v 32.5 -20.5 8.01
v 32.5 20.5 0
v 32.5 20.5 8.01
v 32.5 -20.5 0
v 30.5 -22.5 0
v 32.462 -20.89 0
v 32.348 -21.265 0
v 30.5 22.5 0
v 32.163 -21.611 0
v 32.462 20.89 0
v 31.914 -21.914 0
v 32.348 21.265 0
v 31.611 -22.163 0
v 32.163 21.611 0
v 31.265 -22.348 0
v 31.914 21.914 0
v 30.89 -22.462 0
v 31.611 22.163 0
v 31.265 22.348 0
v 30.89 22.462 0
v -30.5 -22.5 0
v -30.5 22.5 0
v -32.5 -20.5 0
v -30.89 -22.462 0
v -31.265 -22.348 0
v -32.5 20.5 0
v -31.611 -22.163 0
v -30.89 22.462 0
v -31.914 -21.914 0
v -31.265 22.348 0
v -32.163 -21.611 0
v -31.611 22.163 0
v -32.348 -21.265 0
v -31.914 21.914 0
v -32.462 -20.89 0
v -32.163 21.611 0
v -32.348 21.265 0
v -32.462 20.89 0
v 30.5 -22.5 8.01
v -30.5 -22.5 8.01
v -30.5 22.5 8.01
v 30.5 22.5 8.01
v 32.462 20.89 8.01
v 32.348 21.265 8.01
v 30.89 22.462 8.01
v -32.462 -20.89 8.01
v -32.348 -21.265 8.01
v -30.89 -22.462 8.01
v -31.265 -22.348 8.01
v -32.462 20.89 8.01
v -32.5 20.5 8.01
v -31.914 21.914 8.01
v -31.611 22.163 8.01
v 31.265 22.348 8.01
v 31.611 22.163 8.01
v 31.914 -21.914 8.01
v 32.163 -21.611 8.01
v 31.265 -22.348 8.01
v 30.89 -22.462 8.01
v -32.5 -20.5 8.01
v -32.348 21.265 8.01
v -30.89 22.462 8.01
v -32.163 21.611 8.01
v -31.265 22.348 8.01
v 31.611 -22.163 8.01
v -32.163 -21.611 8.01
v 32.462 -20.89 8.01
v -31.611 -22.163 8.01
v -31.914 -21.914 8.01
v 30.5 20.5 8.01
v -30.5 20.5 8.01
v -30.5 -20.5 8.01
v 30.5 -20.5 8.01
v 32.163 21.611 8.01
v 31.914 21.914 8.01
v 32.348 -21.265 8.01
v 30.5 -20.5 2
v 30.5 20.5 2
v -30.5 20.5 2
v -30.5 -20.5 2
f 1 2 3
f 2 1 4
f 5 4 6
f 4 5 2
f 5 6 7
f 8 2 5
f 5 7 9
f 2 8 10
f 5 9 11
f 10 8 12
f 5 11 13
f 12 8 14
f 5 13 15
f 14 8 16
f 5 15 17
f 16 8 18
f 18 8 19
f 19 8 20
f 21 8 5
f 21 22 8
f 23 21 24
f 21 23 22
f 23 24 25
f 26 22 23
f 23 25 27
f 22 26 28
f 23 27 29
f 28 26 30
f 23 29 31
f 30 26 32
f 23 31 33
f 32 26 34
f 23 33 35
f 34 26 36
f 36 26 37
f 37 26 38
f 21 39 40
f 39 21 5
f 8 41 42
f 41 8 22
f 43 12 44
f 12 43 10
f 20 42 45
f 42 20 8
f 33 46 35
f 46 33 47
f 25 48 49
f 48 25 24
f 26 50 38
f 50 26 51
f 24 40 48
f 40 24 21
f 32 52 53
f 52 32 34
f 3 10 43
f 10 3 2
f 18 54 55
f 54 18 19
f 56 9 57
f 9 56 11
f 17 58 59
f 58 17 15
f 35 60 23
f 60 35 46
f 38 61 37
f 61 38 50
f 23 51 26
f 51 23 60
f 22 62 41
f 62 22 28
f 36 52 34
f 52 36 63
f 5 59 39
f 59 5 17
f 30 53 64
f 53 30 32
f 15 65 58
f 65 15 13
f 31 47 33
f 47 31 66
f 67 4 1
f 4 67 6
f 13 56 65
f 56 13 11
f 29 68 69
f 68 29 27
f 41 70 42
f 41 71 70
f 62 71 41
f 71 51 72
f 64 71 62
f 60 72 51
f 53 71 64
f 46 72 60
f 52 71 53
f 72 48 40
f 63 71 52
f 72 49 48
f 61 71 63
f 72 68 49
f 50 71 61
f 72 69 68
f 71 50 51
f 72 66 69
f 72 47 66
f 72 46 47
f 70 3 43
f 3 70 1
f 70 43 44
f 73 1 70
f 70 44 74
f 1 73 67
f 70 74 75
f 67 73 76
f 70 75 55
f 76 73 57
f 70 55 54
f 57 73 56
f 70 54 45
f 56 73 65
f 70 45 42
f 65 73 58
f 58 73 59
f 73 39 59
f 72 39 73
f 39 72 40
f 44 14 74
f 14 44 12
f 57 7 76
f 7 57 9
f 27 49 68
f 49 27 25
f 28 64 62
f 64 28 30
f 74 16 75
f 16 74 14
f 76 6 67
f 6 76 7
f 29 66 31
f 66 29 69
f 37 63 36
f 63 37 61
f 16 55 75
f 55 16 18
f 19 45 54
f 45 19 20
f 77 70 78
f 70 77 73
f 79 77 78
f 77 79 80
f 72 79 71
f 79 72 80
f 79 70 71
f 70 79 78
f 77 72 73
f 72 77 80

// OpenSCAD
board_w=58; board_h=38; wall=2; clearance=1.5; base_d=8; lid_d=12;
outer_w=board_w+2*clearance+2*wall; outer_h=board_h+2*clearance+2*wall;
module rounded_box(w,h,d,r=2){minkowski(){cube([w-2*r,h-2*r,d],center=true);cylinder(r=r,h=.01,$fn=32);}}
module base(){difference(){translate([0,0,base_d/2])rounded_box(outer_w,outer_h,base_d,2);translate([0,0,base_d/2+wall])cube([outer_w-2*wall,outer_h-2*wall,base_d],center=true);}}
module lid(){difference(){translate([0,0,lid_d/2])rounded_box(outer_w,outer_h,lid_d,2);translate([0,0,lid_d/2-wall])cube([outer_w-2*wall,outer_h-2*wall,lid_d],center=true);for(y=[-outer_h/2+6:5:outer_h/2-6])translate([0,y,lid_d-wall/2])cube([outer_w-10,2.5,wall+2],center=true);}}
base();
